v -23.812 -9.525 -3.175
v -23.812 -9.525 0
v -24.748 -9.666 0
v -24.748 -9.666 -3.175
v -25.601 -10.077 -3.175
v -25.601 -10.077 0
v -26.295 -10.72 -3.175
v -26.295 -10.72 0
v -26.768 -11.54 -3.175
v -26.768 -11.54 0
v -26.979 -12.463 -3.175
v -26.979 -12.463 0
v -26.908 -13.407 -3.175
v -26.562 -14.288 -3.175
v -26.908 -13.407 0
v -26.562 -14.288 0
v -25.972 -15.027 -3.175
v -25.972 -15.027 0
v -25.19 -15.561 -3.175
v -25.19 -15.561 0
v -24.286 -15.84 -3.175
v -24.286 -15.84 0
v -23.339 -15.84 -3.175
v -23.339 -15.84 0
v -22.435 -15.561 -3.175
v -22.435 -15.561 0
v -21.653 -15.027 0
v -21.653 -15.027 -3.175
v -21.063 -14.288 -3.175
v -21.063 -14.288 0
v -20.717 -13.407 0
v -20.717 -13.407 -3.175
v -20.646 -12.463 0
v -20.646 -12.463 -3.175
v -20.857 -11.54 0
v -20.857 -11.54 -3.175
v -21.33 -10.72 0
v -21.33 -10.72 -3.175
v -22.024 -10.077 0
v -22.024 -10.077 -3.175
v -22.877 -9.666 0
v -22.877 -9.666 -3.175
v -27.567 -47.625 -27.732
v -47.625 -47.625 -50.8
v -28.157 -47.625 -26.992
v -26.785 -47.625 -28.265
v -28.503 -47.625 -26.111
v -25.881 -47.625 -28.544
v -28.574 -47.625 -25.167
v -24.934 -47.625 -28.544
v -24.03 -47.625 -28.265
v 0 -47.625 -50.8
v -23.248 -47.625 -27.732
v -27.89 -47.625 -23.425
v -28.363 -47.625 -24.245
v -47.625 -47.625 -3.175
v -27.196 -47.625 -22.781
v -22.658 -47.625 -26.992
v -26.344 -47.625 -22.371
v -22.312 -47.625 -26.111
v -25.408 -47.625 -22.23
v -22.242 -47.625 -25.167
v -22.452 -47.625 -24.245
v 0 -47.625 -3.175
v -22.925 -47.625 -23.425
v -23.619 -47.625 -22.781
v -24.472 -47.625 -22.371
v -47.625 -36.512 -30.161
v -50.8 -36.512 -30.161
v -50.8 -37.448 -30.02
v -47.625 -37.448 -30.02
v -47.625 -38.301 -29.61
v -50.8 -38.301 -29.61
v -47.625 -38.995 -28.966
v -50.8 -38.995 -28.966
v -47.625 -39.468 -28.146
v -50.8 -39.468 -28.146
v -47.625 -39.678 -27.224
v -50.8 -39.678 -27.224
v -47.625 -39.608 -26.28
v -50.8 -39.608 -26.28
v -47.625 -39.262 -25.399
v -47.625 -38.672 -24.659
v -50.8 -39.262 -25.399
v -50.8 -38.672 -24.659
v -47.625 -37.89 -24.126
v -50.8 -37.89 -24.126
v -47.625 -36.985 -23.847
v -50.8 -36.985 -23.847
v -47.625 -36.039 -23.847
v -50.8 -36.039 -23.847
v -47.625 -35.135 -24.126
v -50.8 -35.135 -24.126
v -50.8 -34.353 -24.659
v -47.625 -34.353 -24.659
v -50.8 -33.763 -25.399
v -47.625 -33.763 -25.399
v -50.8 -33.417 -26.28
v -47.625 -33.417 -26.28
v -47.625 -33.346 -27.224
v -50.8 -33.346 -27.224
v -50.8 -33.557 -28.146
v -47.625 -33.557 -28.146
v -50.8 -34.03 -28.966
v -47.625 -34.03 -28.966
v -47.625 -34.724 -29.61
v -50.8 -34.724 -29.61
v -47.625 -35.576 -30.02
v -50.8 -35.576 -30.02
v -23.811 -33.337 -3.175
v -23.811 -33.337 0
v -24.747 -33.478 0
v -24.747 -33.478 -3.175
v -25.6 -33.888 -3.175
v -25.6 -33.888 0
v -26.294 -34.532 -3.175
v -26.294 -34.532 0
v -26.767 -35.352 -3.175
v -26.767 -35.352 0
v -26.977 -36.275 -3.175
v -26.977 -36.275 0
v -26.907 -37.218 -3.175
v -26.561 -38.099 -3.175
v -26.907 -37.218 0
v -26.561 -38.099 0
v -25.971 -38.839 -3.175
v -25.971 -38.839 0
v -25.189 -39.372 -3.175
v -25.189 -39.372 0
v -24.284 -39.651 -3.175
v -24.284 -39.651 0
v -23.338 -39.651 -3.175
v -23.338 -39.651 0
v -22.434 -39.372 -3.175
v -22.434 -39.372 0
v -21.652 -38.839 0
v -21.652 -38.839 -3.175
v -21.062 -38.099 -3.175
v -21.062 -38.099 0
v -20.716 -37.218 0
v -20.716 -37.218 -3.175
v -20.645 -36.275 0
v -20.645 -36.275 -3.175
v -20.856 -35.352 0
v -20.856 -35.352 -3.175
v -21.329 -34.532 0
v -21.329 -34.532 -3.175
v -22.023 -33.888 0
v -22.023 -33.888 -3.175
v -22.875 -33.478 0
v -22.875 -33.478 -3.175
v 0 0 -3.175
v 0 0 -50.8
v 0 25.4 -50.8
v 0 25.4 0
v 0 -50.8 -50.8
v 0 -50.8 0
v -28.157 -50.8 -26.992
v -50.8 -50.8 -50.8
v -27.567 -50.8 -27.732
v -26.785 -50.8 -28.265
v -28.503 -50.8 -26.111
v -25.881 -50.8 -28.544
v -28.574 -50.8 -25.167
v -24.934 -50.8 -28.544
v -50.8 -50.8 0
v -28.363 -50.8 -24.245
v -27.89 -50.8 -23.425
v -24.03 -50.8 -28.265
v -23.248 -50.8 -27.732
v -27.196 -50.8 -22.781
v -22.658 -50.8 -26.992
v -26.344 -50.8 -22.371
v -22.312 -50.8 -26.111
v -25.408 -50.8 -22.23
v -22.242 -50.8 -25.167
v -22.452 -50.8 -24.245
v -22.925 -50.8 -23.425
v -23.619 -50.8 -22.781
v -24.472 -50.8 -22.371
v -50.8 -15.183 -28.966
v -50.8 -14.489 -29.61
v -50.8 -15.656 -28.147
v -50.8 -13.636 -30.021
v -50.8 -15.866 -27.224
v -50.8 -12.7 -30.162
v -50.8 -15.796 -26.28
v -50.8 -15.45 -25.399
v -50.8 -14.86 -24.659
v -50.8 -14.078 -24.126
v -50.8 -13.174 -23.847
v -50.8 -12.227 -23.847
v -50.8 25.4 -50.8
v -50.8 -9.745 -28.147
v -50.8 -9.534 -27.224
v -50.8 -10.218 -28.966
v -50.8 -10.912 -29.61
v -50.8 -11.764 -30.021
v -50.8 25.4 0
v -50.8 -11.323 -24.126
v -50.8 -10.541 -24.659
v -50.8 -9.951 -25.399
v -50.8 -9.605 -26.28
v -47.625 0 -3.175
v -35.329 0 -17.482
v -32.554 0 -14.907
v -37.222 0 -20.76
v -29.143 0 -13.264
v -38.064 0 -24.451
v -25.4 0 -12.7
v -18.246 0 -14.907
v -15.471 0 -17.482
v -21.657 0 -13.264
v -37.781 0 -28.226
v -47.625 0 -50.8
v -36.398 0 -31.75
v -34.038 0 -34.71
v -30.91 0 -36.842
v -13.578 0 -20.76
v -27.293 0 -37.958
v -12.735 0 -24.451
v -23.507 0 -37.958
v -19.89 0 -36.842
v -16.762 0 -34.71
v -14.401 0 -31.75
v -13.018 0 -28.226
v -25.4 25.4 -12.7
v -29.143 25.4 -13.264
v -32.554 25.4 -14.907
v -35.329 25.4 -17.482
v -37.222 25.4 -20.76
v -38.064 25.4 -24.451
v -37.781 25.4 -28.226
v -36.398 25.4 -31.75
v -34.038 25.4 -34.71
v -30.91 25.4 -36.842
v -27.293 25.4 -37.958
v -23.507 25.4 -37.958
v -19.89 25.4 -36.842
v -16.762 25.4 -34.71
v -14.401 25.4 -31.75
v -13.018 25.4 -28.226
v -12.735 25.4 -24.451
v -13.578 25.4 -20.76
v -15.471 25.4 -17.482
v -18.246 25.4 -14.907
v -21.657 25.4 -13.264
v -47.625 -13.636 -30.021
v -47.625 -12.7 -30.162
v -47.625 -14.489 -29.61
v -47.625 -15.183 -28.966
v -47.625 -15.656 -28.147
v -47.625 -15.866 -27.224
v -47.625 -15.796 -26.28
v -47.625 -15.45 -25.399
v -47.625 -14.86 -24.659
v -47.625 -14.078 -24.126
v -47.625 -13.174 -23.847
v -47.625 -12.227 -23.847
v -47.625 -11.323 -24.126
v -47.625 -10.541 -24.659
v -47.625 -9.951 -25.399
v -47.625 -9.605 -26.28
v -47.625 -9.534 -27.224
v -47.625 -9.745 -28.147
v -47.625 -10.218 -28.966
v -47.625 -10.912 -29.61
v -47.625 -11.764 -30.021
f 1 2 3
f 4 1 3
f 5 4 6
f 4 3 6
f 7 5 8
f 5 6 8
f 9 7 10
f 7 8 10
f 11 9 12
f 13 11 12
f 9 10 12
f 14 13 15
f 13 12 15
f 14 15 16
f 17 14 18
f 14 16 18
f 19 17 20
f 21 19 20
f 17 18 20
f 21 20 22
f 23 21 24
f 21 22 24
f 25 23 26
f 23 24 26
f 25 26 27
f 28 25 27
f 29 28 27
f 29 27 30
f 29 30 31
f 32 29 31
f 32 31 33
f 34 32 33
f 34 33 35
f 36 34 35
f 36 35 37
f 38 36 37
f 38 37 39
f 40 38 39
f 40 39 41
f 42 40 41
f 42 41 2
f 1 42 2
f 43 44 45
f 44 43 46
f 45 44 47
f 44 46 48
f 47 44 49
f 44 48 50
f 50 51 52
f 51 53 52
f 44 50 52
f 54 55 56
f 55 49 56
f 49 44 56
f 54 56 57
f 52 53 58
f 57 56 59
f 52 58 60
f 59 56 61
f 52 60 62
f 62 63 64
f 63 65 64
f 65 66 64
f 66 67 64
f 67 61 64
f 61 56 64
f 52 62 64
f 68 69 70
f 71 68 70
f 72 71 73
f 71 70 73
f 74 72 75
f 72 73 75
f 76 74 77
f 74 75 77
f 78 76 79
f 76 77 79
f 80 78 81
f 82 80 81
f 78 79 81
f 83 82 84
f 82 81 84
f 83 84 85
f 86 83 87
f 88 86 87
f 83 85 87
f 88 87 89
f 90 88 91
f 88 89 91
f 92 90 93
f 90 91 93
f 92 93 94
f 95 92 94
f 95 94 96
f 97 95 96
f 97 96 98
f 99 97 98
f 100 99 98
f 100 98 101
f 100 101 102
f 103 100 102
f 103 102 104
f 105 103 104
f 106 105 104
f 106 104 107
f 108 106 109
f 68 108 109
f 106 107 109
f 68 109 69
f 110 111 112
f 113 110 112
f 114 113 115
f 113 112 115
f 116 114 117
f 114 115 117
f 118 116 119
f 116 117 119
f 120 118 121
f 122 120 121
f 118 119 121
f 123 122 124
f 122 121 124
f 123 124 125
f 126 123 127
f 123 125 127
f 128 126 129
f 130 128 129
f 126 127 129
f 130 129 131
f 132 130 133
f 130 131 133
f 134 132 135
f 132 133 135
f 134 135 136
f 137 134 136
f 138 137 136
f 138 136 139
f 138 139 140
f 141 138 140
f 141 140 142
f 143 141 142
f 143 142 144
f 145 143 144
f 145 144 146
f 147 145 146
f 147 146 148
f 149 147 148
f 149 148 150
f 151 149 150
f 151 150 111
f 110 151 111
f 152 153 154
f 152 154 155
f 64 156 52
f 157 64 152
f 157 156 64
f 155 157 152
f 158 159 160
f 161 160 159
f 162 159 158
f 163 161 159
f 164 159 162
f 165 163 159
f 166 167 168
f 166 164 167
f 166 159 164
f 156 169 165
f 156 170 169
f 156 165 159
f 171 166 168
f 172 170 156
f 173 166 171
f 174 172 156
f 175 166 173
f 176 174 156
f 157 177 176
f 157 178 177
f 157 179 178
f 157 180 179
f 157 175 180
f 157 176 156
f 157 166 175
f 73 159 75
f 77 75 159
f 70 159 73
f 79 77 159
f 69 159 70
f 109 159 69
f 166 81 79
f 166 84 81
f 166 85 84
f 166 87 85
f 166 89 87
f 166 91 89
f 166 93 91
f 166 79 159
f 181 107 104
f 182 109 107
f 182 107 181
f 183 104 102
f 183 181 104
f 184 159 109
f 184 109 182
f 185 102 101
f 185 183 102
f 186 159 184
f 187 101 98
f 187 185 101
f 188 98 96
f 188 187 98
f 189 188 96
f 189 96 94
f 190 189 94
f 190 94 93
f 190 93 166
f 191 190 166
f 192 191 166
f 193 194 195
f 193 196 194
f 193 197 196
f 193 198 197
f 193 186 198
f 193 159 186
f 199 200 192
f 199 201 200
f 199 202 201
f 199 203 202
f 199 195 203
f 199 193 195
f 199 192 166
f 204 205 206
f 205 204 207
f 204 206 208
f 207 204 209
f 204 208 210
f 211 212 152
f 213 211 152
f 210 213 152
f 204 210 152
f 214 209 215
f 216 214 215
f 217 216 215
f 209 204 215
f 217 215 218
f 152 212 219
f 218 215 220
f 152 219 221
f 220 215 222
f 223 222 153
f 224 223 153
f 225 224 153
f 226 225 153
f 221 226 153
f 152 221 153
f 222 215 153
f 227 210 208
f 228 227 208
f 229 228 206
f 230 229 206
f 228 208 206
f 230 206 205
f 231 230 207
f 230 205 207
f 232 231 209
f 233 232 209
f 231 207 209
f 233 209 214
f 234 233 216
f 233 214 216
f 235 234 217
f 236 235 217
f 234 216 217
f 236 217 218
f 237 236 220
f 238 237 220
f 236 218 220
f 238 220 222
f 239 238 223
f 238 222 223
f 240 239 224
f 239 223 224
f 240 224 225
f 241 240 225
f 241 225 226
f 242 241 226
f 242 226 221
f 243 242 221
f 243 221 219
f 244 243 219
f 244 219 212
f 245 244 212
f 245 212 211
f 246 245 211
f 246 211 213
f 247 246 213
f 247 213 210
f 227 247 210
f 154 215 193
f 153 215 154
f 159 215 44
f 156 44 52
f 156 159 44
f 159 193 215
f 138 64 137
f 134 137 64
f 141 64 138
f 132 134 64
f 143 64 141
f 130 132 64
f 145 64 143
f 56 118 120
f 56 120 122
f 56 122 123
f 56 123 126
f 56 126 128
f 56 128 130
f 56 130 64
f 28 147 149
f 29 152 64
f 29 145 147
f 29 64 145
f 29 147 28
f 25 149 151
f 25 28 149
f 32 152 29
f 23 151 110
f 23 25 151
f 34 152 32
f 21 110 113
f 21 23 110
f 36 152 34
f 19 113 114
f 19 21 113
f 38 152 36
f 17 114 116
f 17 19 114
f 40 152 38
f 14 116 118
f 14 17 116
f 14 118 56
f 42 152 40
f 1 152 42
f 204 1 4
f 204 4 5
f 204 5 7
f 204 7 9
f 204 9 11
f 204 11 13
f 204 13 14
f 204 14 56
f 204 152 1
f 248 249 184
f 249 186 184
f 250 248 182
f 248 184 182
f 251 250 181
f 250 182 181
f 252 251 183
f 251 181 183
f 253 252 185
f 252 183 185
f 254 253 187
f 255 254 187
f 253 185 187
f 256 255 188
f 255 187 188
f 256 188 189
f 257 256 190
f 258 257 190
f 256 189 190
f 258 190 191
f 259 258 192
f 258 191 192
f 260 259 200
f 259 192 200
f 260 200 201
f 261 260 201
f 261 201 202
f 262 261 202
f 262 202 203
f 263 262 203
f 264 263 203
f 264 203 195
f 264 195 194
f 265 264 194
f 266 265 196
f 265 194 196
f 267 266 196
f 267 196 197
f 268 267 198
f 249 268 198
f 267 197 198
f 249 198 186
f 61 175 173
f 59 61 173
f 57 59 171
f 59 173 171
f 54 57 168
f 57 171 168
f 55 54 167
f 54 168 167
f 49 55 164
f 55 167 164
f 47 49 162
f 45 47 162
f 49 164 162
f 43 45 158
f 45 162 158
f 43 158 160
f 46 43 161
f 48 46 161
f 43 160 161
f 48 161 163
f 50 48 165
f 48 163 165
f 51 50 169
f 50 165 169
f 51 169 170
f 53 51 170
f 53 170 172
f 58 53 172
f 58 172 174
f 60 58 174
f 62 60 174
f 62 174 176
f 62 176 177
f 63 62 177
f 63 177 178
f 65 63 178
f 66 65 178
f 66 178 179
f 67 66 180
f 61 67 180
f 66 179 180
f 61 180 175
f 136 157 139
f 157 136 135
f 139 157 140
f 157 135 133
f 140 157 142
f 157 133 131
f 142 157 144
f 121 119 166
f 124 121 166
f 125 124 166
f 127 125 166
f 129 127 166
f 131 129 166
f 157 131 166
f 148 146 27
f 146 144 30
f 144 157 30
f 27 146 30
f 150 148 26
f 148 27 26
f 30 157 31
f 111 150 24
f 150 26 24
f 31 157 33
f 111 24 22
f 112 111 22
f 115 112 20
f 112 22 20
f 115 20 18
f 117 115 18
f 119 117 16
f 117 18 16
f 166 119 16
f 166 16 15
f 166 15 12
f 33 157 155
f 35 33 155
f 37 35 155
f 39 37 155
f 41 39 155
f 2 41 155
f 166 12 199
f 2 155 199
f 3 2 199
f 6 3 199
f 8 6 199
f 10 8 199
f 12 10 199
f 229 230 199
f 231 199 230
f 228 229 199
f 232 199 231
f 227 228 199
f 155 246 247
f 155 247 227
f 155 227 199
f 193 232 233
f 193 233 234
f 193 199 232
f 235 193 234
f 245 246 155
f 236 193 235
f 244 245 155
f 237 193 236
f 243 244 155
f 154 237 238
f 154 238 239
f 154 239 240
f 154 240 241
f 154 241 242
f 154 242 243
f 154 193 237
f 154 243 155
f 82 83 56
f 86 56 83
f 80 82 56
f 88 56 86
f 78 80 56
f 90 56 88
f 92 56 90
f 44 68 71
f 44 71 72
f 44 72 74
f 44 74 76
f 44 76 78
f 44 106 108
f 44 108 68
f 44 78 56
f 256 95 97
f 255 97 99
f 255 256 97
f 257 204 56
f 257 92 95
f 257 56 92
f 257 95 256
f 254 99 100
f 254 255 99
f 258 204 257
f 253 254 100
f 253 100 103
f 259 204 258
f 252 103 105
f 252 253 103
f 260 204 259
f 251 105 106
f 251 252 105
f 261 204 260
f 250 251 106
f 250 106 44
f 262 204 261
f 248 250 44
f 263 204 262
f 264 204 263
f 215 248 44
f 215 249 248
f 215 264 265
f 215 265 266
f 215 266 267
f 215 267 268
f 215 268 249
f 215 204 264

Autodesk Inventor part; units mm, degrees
ref_plane "YZ Plane" through (0, 0, 0) normal (1, 0, 0) x (0, 1, 0)
ref_plane "XZ Plane" through (0, 0, 0) normal (0, 1, 0) x (-1, 0, 0)
ref_plane "XY Plane" through (0, 0, 0) normal (0, 0, 1) x (1, 0, 0)
sketch "Sketch1" plane through (0, 0, 0) normal (0, 1, 0) x (-1, 0, 0)
  line L0 (0, 0) -> (50.8, 0)
  line L1 (50.8, 0) -> (50.8, -50.8)
  line L2 (50.8, -50.8) -> (0, -50.8)
  line L3 (0, -50.8) -> (0, 0)
  line L4 (47.625, -3.175) -> (3.175, -3.175)
  line L5 (3.175, -3.175) -> (3.175, -47.625)
  line L6 (3.175, -47.625) -> (47.625, -47.625)
  line L7 (47.625, -47.625) -> (47.625, -3.175)
  line L8 (47.625, -47.625) -> (47.625, -50.8)
  line L9 (3.175, -3.175) -> (0, -3.175)
  dimension "d0" = 50.8
  dimension "d1" = 50.8
  dimension "d2" = 3.175
extrude "Extrusion1" add sketch "Sketch1" against normal blind 25.4 contours L0 L1 L2 L8 L7 L4 L9 L3
sketch "Sketch2" plane through (0, 0, 0) normal (0, 1, 0) x (1, 0, 0)
  line L0 (-50.8, 0) -> (-50.8, 50.8) projected
  line L1 (-50.8, 0) -> (0, 0)
  line L2 (0, 0) -> (0, 50.8)
  line L3 (0, 50.8) -> (-50.8, 50.8)
  line L4 (-50.8, 50.8) -> (-50.8, 0)
  dimension "d5" = 50.8
extrude "Extrusion2" add sketch "Sketch2" along normal blind 25.4
sketch "Sketch3" plane through (0, 25.4, 0) normal (0, 1, 0) x (1, 0, 0)
  line L0 (-50.8, 0) -> (-50.8, 50.8) construction
  line L1 (-50.8, 0) -> (0, 50.8) construction
  line L2 (0, 0) -> (-50.8, 0) construction
  line L3 (0, 0) -> (-50.8, 50.8) construction
  point P0 (-25.61, 25.3161)
sketch "Sketch4" plane through (0, 25.4, 0) normal (0, 1, 0) x (1, 0, 0)
  point P0 (0, 0)
  point P1 (-25.3999, 25.4)
hole "Hole1" at (-25.3999, 25.4, -25.4) direction (0, -1, 0) diameter 25.4 end through all
sketch "Sketch5" plane through (0, -25.4, -3.175) normal (0, 0, -1) x (-1, 0, 0)
  line L0 (0, 25.4) -> (0, 0) construction
  line L1 (47.625, 0) -> (0, 0) construction
  line L2 (0, 25.4) -> (47.625, 0) construction
  line L3 (0, 25.4) -> (47.625, 25.4) construction
  line L4 (0, 0) -> (47.625, 25.4) construction
sketch "Sketch6" plane through (0, -25.4, -3.175) normal (0, 0, -1) x (-1, 0, 0)
  point P0 (0, 25.4)
  point P1 (23.8125, 12.7)
hole "Hole2" at (-23.8125, -12.7, -3.175) direction (0, 0, 1) diameter 6.35 end through all
sketch "Sketch7" plane through (-47.625, -25.4, -3.175) normal (1, 0, 0) x (0, 0, -1)
  line L0 (47.625, 0) -> (0, 0) construction
  line L1 (0, 25.4) -> (0, 0) construction
  line L2 (47.625, 0) -> (0, 25.4) construction
  line L3 (47.625, 25.4) -> (47.625, 0) construction
  line L4 (0, 0) -> (47.625, 25.4) construction
  point P0 (-3.175, 25.4)
sketch "Sketch8" plane through (-47.625, -25.4, -3.175) normal (1, 0, 0) x (0, 0, -1)
  point P0 (-3.175, 25.4)
  point P1 (23.8116, 12.6997)
hole "Hole3" at (-47.625, -12.7003, -26.9866) direction (-1, 0, 0) diameter 6.35 end through all
sketch "Sketch9" plane through (0, -25.4, 0) normal (0, -1, 0) x (1, 0, 0)
  line L0 (-50.8, -50.8) -> (-50.8, 0) projected
  line L1 (0, 0) -> (-50.8, 0)
  line L2 (-50.8, 0) -> (-50.8, -50.8)
  line L3 (-50.8, -50.8) -> (0, -50.8)
  line L4 (0, -50.8) -> (0, 0)
  line L5 (-47.625, -3.175) -> (-3.175, -3.175)
  line L6 (-3.175, -3.175) -> (-3.175, -47.625)
  line L7 (-3.175, -47.625) -> (-47.625, -47.625)
  line L8 (-47.625, -47.625) -> (-47.625, -3.175)
  line L9 (0, -3.175) -> (-47.625, -3.175) projected
  line L10 (-3.175, -3.175) -> (0, -3.175)
  line L11 (-47.625, -47.625) -> (-47.625, -50.8)
  point P0 (-3.175, -3.175)
extrude "Extrusion3" add sketch "Sketch9" along normal blind 25.4 contours L0 L1 L4 L9 L5 L8 L11 L3
sketch "Sketch10" plane through (0, -50.8, 0) normal (0, -1, 0) x (1, 0, 0)
  line L0 (0, 0) -> (-50.8, 0)
  line L1 (-50.8, 0) -> (-50.8, -50.8)
  line L2 (-50.8, -50.8) -> (0, -50.8)
  line L3 (0, -50.8) -> (0, 0)
extrude "Extrusion4" add sketch "Sketch10" against normal blind 3.175
sketch "Sketch11" plane through (0, 0, -3.175) normal (0, 0, -1) x (-1, 0, 0)
  line L0 (47.625, 0) -> (47.625, -47.625) construction
  line L1 (47.625, -47.625) -> (0, -25.4001) construction
  line L2 (0, 0) -> (0, -47.625) construction
  line L3 (0, -47.625) -> (47.625, -47.625) construction
  line L4 (47.625, -25.4001) -> (0, -47.625) construction
sketch "Sketch12" plane through (0, 0, -3.175) normal (0, 0, -1) x (-1, 0, 0)
  point P0 (0, 0)
  point P1 (23.8112, -36.5118)
hole "Hole4" at (-23.8112, -36.5118, -3.175) direction (0, 0, 1) diameter 6.35 end through all
sketch "Sketch13" plane through (-47.625, 0, -3.175) normal (1, 0, 0) x (0, 0, -1)
  line L0 (0, 0) -> (0, -47.625) construction
  line L1 (0, -47.625) -> (47.625, -47.625) construction
  line L2 (0, -25.4031) -> (47.625, -47.625) construction
  line L3 (0, -47.625) -> (47.625, -25.4031) construction
  line L4 (47.625, 0) -> (47.625, -47.625) construction
  point P0 (-3.175, 0)
sketch "Sketch14" plane through (-47.625, 0, -3.175) normal (1, 0, 0) x (0, 0, -1)
  point P0 (-3.175, 0)
  point P1 (23.8113, -36.5122)
hole "Hole5" at (-47.625, -36.5122, -26.9863) direction (-1, 0, 0) diameter 6.35 end through all
sketch "Sketch15" plane through (0, -47.625, 0) normal (0, 1, 0) x (1, 0, 0)
  line L0 (-50.8, 0) -> (-50.8, 50.8) construction
  line L1 (0, 0) -> (-50.8, 50.8) construction
  line L2 (0, 0) -> (0, 50.8) construction
  line L3 (-50.8, 0) -> (0, 50.8) construction
sketch "Sketch16" plane through (0, -47.625, 0) normal (0, 1, 0) x (1, 0, 0)
  point P0 (0, 0)
  point P1 (-25.4077, 25.4046)
hole "Hole6" at (-25.4077, -47.625, -25.4046) direction (0, -1, 0) diameter 6.35 end through all
properties part number "Bearing Housing"
